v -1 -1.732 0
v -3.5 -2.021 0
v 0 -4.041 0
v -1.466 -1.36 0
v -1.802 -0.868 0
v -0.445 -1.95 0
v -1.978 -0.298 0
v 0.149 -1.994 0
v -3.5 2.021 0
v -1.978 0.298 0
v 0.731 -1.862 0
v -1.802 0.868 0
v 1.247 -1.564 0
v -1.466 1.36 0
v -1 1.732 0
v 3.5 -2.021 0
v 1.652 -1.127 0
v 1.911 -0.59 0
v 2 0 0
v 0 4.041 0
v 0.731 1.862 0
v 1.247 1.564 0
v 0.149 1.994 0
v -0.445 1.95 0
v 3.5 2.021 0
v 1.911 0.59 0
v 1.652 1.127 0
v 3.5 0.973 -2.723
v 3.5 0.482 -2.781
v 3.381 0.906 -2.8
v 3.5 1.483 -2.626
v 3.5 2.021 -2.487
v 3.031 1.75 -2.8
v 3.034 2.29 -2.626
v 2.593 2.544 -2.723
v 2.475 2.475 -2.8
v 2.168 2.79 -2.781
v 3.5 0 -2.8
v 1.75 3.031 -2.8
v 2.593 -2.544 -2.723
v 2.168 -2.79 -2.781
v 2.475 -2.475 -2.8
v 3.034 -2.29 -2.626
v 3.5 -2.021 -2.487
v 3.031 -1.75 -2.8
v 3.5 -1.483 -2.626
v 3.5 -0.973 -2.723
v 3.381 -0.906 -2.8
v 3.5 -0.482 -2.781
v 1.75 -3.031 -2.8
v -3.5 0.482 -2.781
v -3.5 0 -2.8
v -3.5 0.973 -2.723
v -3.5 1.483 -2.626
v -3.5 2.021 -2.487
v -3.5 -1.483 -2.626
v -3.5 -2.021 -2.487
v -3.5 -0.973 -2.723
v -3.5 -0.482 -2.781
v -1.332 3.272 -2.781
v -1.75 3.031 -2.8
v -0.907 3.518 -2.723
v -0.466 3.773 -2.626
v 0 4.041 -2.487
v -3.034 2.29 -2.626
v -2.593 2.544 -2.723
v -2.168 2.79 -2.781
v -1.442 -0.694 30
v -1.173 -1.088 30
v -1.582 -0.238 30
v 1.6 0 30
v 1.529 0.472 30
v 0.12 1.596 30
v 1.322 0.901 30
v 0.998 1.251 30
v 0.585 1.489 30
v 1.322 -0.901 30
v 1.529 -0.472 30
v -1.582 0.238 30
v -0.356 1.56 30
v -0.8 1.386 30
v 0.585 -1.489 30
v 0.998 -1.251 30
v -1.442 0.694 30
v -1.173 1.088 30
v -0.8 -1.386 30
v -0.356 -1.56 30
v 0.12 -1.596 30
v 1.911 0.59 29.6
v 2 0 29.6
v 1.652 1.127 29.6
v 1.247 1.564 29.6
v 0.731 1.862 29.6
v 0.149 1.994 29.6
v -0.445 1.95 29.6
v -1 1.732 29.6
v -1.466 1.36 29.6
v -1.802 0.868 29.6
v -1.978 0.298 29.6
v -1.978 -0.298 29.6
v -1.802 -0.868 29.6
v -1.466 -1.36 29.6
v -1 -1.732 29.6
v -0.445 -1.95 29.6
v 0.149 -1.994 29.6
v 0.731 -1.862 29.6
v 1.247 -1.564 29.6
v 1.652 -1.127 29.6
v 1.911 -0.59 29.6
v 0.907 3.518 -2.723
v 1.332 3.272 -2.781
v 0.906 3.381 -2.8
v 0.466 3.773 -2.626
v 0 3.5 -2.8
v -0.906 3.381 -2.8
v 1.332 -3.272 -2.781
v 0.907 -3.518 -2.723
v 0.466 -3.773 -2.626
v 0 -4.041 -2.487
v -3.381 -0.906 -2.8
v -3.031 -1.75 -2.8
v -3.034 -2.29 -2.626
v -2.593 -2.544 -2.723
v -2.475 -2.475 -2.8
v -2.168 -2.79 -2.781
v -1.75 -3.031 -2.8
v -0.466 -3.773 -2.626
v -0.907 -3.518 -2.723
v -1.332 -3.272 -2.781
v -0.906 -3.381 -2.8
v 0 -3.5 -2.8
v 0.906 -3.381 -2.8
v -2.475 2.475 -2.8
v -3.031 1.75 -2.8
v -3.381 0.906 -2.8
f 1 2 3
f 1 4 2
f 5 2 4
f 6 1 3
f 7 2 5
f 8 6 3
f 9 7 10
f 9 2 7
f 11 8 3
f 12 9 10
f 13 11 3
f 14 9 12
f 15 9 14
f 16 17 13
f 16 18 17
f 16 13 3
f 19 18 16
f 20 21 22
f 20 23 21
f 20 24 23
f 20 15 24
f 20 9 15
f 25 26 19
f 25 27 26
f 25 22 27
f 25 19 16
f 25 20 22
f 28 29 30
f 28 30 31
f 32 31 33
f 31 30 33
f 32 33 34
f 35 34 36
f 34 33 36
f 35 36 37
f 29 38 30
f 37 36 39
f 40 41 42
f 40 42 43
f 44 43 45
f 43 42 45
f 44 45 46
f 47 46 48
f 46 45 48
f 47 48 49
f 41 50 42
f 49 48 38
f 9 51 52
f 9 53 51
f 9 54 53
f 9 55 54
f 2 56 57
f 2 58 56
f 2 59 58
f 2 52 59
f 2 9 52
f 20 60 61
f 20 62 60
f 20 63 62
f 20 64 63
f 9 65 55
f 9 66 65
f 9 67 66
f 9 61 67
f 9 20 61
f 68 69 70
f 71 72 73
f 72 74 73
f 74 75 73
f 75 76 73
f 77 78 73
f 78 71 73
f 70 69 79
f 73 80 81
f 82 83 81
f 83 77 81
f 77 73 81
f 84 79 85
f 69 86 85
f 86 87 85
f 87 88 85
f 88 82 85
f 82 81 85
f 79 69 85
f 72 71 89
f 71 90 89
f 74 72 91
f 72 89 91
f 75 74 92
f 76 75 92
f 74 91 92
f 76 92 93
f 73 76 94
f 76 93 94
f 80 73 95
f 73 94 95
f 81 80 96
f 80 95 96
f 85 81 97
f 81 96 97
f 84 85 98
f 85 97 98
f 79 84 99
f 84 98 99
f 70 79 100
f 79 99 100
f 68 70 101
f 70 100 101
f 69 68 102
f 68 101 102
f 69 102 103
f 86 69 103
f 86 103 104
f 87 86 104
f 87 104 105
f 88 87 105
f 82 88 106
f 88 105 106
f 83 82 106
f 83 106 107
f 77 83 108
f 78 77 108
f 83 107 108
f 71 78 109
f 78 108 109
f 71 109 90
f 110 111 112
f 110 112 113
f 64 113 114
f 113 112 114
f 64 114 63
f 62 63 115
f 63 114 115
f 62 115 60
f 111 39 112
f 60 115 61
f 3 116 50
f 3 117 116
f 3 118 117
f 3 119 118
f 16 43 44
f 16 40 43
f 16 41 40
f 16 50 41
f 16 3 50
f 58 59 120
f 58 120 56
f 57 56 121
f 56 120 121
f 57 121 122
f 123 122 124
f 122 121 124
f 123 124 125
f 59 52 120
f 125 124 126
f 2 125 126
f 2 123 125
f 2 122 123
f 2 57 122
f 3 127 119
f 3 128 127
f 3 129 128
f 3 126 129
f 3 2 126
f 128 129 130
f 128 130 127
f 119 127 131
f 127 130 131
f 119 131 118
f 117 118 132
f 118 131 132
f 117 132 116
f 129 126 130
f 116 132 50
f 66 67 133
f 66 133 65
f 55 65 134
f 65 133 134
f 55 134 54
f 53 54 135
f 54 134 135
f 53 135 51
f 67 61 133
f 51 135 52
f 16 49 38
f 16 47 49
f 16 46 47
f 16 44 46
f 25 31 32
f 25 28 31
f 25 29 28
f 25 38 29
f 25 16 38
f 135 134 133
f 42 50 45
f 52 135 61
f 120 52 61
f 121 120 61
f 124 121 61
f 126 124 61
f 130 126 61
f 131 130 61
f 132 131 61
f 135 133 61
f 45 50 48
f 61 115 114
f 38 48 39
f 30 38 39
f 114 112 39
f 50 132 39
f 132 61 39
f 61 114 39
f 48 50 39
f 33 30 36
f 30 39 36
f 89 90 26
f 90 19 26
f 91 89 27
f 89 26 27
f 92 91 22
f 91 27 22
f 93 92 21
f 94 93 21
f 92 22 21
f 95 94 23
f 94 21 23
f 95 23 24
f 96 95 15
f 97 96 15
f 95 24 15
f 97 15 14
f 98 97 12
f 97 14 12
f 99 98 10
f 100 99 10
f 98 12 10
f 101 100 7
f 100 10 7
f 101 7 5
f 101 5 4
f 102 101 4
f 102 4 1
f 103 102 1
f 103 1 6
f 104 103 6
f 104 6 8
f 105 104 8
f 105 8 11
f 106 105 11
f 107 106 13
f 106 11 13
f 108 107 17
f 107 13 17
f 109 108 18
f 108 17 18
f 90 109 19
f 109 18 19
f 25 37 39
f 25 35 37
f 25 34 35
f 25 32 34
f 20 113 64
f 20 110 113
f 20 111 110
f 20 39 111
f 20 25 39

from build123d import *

# Parameters (mm, degrees)
ESQUISSE1_W        = 2
ESQUISSE1_H        = 30
BOSS_EXTRU_1_DEPTH = 2.8


with BuildPart() as part:
    # Esquisse1 → Base-Révolution (revolve)
    with BuildSketch(Plane(origin=(0, 0, 0), x_dir=(1, 0, 0), z_dir=(0, 1, 0))):
        with Locations((1, -15)):
            Rectangle(ESQUISSE1_W, ESQUISSE1_H)
    revolve(axis=Axis((0, 0, 0), (0, 0, 1)))

    # Chanfrein1: read off the stored shape, not the designer's step
    # Chanfrein1 outline → Chanfrein1 (revolve, cut)
    with BuildSketch(Plane.XZ):
        Polygon((2, 30), (1.6, 30), (2, 29.6), align=None)
    revolve(axis=Axis((0, 0, 0), (0, 0, 1)), mode=Mode.SUBTRACT)

    # Esquisse6 → Boss.-Extru.1 (add)
    with BuildSketch(Plane.XY):
        Polygon((3.5, -2.020725942), (3.5, 2.020725942), (0, 4.041451884), (-3.5, 2.020725942), (-3.5, -2.020725942), (0, -4.041451884), align=None)
    extrude(amount=-BOSS_EXTRU_1_DEPTH)

    # Esquisse7 → Enlèvement de matière-Révolution1 (revolve, cut)
    with BuildSketch(Plane(origin=(0, 0, 0), x_dir=(1, 0, 0), z_dir=(0, 1, 0))):
        Polygon((-3.5, 2.8), (-8.349742261, 2.8), (-8.349742261, 0), align=None)
    revolve(axis=Axis((0, 0, -6.239446496), (0, 0, 1)), mode=Mode.SUBTRACT)


solid = part.part
